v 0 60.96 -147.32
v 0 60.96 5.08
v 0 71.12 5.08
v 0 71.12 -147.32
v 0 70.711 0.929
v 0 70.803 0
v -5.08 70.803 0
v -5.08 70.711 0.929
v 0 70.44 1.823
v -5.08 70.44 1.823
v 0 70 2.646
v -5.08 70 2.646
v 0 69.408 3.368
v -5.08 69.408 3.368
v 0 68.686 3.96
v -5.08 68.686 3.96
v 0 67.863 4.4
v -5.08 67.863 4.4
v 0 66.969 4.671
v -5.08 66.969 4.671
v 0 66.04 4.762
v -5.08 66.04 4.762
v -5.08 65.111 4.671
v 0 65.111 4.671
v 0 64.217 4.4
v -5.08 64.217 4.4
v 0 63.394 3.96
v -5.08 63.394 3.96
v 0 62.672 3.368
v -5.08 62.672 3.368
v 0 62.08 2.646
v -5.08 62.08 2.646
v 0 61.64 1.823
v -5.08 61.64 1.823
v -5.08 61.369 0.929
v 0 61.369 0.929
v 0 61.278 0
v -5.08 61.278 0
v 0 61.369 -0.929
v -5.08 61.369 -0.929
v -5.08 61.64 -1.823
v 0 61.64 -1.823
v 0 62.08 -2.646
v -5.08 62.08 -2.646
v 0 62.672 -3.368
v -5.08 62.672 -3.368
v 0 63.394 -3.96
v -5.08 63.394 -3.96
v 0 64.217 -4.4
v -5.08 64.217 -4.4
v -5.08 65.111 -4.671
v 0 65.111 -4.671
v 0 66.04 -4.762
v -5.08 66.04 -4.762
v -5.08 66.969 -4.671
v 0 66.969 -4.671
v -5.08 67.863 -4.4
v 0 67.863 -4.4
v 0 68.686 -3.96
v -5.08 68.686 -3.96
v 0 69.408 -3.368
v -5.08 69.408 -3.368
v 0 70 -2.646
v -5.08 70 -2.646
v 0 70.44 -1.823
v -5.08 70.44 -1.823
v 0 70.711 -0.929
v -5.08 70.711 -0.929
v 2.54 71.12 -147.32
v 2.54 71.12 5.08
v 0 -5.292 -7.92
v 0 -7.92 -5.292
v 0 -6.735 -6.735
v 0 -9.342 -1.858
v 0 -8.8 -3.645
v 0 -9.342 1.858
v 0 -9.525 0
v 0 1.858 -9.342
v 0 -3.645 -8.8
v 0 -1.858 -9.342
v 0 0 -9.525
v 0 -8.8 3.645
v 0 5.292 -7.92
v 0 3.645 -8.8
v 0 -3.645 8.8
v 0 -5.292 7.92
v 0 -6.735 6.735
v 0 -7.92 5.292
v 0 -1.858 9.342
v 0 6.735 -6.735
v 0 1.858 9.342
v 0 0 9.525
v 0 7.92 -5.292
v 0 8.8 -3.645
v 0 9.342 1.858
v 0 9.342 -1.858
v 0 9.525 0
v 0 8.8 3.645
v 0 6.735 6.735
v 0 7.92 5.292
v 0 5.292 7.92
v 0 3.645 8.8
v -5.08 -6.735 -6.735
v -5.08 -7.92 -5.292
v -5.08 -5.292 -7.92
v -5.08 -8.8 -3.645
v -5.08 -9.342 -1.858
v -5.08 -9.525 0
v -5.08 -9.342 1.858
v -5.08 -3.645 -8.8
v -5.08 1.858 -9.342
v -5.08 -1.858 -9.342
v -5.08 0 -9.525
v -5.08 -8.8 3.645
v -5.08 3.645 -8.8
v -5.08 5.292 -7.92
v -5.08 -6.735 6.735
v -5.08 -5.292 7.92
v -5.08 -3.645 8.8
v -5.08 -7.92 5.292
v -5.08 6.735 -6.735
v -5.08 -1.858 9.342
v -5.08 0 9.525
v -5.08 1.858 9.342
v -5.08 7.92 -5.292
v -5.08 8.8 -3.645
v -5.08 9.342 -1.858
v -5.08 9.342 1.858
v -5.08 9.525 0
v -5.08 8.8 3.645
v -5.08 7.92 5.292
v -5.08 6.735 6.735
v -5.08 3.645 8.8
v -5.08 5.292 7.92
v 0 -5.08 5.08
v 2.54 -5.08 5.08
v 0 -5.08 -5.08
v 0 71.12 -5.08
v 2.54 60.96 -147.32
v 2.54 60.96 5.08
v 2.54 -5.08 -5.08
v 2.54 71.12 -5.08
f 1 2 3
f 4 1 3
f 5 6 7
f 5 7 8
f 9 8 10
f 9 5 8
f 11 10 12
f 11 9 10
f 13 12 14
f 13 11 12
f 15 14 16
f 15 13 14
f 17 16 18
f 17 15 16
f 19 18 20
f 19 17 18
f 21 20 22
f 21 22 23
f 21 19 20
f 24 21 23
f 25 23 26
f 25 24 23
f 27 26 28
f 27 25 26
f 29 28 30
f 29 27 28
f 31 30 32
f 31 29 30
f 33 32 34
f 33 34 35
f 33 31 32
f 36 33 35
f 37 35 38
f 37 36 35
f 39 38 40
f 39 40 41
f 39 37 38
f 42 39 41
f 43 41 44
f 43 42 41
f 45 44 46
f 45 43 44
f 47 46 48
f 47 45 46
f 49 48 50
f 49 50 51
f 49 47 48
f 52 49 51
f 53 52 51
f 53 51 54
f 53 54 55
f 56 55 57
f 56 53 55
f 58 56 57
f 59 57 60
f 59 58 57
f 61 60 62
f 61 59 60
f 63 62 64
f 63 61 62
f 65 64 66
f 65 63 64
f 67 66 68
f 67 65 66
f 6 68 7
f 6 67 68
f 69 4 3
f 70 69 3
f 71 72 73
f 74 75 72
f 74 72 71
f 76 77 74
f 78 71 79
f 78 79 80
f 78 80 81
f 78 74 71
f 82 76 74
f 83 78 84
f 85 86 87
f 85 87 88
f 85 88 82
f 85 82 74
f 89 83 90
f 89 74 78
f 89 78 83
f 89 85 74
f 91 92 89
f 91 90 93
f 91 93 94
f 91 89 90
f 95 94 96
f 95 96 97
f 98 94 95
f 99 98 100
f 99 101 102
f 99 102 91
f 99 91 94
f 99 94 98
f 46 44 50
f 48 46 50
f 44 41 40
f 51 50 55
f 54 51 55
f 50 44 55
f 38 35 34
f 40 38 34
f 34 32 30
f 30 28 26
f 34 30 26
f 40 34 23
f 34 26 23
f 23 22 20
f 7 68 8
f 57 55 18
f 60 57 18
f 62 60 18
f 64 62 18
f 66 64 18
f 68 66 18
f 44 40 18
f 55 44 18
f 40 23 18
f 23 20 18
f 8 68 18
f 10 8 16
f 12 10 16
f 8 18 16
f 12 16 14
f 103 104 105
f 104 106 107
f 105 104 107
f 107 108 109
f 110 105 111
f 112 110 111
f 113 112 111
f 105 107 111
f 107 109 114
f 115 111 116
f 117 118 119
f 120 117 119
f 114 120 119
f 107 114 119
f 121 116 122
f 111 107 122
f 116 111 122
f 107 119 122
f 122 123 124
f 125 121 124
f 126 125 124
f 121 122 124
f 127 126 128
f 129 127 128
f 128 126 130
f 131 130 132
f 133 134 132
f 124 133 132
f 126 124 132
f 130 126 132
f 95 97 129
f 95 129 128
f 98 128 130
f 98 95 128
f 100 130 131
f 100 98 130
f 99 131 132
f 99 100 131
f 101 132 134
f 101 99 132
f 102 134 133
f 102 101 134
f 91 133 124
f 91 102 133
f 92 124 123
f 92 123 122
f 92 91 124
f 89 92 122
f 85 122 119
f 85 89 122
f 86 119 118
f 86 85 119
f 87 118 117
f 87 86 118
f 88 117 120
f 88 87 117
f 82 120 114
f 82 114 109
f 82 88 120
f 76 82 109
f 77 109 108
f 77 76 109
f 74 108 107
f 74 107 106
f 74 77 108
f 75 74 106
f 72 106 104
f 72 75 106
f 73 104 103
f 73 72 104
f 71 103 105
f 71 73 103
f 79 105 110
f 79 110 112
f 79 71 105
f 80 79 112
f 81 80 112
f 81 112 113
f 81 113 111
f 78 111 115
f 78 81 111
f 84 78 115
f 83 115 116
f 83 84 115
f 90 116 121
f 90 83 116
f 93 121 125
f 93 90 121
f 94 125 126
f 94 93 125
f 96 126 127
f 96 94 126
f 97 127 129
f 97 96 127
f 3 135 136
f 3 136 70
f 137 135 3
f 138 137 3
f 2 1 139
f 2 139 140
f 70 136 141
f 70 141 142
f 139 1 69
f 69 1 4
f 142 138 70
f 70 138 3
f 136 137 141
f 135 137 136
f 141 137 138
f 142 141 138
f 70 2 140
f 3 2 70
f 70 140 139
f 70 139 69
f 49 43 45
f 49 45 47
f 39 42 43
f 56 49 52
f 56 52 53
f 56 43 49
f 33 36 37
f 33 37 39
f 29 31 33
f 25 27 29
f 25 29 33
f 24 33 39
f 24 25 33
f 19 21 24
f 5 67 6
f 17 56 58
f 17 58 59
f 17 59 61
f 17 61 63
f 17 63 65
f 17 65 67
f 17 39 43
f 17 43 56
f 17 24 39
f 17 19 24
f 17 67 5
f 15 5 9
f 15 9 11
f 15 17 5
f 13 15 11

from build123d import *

# Parameters (mm, degrees)
F0_W     = 76.2
F0_H     = 10.16
F1_DEPTH = 2.54
F2_R     = 9.525
F2_R_2   = 4.7625
F3_DEPTH = 5.08
F4_W     = 10.16
F4_H     = 152.4
F5_DEPTH = 2.54


with BuildPart() as f1:
    # F0 (on Right) → F1 (new body)
    with BuildSketch(Plane.YZ):
        with Locations((33.02, 0)):
            Rectangle(F0_W, F0_H)
    extrude(amount=F1_DEPTH)


with BuildPart() as f3:
    # F2 (on Right) → F3 (new body)
    with BuildSketch(Plane.YZ):
        Circle(F2_R)
        with Locations((66.04, 0)):
            Circle(F2_R_2)
    extrude(amount=-F3_DEPTH)


with BuildPart() as f5:
    # F4 (on Right) → F5 (new body)
    with BuildSketch(Plane.YZ):
        with Locations((66.04, -71.12)):
            Rectangle(F4_W, F4_H)
    extrude(amount=F5_DEPTH)


solid = Compound([f1.part, f3.part, f5.part])
